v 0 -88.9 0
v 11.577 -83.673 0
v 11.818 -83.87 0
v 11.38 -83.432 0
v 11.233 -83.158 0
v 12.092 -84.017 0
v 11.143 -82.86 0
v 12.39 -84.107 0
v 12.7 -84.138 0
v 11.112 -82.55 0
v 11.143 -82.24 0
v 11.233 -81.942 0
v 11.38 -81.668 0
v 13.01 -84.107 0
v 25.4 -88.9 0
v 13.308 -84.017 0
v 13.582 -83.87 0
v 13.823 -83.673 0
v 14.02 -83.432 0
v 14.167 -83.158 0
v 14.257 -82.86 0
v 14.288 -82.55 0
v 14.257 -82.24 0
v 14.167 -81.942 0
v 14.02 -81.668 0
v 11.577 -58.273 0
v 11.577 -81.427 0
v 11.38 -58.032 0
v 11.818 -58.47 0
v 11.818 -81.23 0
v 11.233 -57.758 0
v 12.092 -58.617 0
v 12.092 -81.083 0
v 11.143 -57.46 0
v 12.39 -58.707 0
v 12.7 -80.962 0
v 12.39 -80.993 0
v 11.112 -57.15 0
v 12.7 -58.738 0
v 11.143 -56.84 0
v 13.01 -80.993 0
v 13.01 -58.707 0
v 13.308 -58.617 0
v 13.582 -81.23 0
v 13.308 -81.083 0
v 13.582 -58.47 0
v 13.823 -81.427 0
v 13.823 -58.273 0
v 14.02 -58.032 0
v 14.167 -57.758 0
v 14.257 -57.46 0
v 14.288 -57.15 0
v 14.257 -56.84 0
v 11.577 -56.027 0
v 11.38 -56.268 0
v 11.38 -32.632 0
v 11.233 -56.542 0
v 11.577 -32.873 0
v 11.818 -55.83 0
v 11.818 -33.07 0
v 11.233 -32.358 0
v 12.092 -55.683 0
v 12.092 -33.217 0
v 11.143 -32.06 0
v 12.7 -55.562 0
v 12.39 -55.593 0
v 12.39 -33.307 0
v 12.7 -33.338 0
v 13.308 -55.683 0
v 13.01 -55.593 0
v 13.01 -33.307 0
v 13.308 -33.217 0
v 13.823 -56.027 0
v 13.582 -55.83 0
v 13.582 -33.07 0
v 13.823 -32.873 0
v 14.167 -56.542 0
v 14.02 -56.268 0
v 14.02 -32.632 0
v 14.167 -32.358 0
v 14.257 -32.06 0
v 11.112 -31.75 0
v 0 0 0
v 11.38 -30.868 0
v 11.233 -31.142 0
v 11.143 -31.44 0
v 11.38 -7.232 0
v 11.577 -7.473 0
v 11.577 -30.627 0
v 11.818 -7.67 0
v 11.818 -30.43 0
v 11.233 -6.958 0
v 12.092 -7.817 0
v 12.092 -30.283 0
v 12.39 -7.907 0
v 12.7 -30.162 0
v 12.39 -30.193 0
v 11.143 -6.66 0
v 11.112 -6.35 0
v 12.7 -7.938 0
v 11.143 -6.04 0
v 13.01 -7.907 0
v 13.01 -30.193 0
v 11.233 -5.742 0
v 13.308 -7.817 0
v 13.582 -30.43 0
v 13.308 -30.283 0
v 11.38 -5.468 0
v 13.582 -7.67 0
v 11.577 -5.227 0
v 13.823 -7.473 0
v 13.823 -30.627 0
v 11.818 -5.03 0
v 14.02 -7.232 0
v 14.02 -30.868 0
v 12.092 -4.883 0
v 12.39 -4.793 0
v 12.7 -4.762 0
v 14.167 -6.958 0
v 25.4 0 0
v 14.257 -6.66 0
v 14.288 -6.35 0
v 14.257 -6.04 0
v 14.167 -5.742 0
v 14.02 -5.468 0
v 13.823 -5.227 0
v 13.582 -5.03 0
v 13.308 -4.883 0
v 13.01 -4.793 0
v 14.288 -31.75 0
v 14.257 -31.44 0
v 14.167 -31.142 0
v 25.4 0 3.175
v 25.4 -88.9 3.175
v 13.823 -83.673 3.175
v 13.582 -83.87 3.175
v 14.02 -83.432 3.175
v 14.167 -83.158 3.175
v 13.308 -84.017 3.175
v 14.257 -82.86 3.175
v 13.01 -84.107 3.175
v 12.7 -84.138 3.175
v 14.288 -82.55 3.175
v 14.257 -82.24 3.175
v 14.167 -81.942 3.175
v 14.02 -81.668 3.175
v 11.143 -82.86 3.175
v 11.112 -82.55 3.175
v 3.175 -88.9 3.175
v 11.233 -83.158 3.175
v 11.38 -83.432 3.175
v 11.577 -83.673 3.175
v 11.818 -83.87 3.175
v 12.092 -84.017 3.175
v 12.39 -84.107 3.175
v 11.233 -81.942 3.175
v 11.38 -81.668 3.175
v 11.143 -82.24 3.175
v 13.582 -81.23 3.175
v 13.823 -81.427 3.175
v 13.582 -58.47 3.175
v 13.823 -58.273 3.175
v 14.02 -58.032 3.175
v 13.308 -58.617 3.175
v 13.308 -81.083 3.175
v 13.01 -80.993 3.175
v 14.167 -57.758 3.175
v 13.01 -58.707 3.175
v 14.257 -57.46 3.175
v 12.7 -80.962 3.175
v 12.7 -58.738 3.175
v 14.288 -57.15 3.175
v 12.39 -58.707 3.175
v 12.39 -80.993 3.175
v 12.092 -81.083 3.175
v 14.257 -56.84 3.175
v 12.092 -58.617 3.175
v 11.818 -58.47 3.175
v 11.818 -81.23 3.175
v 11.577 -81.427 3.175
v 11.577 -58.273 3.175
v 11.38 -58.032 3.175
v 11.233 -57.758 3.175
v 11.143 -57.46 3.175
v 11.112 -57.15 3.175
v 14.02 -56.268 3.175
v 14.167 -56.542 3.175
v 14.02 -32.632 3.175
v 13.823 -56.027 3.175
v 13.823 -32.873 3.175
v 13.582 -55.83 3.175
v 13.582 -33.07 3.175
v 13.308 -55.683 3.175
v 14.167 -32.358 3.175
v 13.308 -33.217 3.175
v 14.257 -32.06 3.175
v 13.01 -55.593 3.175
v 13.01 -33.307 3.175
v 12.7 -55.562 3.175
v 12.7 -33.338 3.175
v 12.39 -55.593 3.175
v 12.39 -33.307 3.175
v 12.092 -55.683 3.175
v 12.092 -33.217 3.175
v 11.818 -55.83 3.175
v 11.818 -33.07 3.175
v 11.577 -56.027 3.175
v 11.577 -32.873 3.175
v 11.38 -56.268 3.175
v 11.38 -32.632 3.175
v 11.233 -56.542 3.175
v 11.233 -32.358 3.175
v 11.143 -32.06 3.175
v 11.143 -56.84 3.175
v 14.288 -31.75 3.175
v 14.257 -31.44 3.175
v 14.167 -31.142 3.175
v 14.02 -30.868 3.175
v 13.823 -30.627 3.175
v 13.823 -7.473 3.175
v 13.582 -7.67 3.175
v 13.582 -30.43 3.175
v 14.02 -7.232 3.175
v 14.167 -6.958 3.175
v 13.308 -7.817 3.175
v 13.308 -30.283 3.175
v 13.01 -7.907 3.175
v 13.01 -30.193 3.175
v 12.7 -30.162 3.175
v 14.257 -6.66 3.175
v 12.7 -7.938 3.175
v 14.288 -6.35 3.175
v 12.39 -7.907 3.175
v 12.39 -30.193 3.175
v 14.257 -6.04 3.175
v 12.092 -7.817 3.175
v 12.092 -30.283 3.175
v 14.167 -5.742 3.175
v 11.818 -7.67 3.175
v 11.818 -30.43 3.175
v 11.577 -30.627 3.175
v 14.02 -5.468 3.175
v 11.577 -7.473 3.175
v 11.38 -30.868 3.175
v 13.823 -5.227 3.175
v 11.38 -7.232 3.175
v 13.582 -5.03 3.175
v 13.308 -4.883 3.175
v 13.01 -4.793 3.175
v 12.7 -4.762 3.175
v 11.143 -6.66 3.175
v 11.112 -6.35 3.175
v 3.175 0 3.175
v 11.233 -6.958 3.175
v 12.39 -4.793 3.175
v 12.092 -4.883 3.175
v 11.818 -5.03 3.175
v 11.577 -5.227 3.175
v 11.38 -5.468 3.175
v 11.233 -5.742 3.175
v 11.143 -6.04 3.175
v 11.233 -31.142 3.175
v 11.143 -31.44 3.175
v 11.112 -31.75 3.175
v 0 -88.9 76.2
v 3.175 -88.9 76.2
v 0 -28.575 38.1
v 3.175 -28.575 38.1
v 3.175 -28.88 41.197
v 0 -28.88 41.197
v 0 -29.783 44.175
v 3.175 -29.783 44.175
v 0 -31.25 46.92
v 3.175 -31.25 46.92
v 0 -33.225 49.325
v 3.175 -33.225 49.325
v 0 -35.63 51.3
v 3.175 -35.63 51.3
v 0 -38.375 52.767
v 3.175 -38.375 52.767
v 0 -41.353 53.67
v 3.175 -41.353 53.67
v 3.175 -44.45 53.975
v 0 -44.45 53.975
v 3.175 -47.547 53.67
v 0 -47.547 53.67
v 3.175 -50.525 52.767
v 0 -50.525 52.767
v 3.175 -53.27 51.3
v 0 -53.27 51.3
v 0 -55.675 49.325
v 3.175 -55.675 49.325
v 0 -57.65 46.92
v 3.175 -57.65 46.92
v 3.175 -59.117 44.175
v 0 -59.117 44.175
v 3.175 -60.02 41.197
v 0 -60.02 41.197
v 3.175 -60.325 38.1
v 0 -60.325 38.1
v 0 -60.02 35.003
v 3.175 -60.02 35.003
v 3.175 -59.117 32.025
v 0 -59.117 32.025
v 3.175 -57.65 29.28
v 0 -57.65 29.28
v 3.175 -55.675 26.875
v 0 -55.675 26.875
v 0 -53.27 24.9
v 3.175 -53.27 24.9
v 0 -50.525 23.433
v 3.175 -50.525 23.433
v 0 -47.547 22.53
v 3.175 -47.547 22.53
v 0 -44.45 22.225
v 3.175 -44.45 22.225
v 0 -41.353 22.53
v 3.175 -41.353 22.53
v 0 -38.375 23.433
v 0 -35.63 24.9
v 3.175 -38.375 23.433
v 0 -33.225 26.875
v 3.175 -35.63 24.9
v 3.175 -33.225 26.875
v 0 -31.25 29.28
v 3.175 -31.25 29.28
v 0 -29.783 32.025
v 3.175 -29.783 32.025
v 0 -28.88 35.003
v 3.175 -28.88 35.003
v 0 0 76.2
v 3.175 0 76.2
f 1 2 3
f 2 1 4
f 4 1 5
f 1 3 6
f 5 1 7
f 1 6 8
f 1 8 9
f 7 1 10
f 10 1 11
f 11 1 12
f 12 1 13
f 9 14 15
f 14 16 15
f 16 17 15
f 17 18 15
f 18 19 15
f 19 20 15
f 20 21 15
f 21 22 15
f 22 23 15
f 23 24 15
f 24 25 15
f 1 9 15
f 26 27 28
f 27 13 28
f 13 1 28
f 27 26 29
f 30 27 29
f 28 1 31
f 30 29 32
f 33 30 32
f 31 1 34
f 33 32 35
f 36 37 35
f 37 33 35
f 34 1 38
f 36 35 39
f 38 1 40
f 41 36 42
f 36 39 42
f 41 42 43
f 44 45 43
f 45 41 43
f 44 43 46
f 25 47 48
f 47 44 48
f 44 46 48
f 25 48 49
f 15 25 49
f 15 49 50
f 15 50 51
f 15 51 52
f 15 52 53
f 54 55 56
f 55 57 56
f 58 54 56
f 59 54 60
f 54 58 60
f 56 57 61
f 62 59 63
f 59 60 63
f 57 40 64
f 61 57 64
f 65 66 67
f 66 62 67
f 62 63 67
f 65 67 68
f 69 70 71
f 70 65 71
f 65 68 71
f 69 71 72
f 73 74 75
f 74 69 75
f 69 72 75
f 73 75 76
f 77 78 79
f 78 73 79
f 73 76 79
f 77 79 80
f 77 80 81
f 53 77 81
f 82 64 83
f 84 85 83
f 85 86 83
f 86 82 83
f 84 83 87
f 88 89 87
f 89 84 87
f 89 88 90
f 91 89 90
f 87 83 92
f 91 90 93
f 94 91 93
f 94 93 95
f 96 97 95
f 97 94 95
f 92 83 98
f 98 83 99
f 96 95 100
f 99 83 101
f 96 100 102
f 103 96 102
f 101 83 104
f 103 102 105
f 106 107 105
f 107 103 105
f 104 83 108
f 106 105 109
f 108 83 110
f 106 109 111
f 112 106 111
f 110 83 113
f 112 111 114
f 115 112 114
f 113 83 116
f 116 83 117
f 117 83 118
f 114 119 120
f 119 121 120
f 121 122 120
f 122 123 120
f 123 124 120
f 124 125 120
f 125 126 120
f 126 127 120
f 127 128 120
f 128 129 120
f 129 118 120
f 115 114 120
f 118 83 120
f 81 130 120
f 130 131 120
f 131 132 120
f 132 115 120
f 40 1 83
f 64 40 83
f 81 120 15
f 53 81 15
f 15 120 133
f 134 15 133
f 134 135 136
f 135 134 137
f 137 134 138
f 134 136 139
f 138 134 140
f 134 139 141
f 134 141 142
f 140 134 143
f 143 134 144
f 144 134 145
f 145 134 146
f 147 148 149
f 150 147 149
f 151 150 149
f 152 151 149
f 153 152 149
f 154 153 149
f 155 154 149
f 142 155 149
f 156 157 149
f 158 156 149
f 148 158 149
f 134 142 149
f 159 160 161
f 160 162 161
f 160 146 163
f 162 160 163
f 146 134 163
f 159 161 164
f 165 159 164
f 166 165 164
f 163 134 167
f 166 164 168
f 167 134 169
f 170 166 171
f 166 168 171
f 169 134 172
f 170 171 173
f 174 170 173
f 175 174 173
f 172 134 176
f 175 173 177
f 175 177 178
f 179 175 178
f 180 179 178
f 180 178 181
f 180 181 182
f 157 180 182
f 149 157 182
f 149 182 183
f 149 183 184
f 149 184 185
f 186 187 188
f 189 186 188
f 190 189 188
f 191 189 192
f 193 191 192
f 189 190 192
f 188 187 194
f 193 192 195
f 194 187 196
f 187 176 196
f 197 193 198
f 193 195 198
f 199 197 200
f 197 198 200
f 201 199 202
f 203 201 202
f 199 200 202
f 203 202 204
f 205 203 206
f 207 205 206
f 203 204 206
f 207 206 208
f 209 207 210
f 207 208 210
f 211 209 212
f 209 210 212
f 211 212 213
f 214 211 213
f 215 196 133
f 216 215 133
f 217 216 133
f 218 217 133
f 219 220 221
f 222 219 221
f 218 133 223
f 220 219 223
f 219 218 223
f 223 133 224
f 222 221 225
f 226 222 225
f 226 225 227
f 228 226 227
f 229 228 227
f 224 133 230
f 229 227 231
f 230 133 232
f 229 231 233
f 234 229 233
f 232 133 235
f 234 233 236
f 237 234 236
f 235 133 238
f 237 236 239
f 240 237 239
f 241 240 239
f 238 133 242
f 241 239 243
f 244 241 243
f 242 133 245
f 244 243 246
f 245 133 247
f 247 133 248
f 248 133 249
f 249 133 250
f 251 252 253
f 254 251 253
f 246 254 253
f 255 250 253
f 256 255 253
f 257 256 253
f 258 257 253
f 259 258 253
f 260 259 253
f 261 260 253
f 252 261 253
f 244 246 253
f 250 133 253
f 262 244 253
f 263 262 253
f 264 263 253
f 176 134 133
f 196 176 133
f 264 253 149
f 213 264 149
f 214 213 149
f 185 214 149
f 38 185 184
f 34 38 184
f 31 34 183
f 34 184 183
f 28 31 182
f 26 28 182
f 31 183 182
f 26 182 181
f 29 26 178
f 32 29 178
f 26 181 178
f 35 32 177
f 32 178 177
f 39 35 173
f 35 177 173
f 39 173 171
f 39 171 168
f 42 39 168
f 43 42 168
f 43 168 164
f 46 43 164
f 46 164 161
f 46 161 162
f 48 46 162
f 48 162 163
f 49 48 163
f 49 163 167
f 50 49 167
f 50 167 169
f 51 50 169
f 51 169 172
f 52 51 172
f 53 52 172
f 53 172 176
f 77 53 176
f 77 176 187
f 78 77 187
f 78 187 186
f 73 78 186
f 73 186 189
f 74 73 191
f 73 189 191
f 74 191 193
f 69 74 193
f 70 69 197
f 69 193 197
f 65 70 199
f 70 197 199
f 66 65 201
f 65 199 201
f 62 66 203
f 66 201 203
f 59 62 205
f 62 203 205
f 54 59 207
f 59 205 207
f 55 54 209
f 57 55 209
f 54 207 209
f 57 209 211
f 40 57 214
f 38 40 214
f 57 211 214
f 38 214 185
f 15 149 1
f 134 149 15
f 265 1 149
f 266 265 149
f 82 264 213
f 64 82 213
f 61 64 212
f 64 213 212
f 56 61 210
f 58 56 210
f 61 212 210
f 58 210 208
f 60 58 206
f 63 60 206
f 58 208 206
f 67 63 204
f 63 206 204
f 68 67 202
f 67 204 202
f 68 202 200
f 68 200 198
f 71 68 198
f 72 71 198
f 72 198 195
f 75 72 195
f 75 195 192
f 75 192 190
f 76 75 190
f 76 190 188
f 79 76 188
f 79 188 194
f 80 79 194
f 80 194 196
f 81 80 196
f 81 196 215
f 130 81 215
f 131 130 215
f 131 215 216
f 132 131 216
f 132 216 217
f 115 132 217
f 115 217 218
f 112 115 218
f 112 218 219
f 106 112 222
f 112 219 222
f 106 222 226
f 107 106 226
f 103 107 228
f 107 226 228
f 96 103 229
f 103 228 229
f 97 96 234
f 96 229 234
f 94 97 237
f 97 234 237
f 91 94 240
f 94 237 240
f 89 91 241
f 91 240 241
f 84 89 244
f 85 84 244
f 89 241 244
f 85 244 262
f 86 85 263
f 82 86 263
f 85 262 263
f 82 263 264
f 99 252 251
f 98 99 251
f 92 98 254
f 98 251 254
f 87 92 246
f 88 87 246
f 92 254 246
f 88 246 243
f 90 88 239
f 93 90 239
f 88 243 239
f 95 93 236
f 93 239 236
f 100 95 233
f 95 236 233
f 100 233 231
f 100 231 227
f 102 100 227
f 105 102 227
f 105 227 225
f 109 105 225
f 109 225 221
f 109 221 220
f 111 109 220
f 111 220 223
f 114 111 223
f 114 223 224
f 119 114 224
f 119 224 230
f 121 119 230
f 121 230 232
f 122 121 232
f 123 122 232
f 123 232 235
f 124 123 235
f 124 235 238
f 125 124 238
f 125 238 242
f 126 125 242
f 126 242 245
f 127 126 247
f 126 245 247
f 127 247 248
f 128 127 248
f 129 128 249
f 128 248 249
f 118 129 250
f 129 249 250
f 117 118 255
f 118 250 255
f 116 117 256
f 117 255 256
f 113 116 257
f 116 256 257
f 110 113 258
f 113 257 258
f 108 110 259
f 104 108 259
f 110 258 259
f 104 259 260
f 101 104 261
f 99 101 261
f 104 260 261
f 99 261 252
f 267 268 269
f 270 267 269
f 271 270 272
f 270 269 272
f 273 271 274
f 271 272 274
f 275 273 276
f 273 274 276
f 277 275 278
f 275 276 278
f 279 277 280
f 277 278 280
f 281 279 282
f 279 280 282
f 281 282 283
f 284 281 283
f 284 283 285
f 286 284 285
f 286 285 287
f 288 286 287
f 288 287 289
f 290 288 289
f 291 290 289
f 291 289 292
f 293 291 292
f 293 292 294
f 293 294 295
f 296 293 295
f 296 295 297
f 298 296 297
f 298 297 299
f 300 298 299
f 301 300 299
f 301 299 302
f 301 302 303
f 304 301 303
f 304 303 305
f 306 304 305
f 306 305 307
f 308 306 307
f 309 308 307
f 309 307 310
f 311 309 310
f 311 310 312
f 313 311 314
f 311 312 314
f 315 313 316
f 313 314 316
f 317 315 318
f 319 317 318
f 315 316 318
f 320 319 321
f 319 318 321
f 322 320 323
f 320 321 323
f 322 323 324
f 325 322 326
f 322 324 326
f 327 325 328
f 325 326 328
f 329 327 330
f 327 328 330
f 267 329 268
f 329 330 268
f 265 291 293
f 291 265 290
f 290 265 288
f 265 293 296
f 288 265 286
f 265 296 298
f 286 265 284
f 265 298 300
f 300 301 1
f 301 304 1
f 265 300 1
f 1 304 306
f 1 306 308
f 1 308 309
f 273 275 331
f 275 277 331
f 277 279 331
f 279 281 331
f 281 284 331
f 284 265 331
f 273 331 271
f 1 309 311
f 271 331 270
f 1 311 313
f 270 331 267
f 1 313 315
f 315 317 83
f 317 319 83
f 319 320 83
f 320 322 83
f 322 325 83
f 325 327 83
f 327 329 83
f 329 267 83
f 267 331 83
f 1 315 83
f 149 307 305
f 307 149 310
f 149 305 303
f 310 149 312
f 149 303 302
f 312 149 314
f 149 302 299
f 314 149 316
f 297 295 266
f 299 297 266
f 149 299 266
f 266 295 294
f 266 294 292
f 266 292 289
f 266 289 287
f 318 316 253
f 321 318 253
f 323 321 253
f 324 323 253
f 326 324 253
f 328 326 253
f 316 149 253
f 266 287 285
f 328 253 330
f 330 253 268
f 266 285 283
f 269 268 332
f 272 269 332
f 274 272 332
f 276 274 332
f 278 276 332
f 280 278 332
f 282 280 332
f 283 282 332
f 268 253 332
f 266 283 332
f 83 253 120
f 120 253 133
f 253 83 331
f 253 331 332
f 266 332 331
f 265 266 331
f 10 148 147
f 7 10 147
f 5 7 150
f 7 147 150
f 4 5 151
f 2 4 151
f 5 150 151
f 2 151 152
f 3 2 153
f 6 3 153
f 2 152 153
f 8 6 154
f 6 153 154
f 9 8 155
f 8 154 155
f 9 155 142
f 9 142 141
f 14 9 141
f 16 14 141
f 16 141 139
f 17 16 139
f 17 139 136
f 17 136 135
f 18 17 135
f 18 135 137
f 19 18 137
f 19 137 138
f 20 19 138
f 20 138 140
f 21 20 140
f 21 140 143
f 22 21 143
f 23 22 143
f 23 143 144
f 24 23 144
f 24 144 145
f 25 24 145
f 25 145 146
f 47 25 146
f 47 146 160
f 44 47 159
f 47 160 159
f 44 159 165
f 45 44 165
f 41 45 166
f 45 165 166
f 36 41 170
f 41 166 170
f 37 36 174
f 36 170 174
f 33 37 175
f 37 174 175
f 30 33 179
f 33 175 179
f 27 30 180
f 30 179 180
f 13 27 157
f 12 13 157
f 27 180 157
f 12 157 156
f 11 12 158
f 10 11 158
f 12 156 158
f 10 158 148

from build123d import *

# Parameters (mm, degrees)
F1_DEPTH = 88.9
F3_D     = 31.75
F5_D     = 3.175


with BuildPart() as f1:
    # F0 (on Front) → F1 (new body)
    with BuildSketch(Plane.XZ):
        Polygon((0, 76.2), (0, 0), (25.4, 0), (25.4, 3.175), (3.175, 3.175), (3.175, 76.2), align=None)
    extrude(amount=F1_DEPTH)

    # F3 (through all)
    with Locations(Plane(origin=(0, 0, 0), x_dir=(0, -1, 0), z_dir=(-1, 0, 0))):
        with Locations((44.45, 38.1)):
            Hole(F3_D / 2)

    # F5 (through all)
    with Locations(Plane(origin=(0, 0, 0), x_dir=(1, 0, 0), z_dir=(0, 0, -1))):
        with Locations((12.7, 82.55), (12.7, 57.15), (12.7, 31.75), (12.7, 6.35)):
            Hole(F5_D / 2)


solid = f1.part
